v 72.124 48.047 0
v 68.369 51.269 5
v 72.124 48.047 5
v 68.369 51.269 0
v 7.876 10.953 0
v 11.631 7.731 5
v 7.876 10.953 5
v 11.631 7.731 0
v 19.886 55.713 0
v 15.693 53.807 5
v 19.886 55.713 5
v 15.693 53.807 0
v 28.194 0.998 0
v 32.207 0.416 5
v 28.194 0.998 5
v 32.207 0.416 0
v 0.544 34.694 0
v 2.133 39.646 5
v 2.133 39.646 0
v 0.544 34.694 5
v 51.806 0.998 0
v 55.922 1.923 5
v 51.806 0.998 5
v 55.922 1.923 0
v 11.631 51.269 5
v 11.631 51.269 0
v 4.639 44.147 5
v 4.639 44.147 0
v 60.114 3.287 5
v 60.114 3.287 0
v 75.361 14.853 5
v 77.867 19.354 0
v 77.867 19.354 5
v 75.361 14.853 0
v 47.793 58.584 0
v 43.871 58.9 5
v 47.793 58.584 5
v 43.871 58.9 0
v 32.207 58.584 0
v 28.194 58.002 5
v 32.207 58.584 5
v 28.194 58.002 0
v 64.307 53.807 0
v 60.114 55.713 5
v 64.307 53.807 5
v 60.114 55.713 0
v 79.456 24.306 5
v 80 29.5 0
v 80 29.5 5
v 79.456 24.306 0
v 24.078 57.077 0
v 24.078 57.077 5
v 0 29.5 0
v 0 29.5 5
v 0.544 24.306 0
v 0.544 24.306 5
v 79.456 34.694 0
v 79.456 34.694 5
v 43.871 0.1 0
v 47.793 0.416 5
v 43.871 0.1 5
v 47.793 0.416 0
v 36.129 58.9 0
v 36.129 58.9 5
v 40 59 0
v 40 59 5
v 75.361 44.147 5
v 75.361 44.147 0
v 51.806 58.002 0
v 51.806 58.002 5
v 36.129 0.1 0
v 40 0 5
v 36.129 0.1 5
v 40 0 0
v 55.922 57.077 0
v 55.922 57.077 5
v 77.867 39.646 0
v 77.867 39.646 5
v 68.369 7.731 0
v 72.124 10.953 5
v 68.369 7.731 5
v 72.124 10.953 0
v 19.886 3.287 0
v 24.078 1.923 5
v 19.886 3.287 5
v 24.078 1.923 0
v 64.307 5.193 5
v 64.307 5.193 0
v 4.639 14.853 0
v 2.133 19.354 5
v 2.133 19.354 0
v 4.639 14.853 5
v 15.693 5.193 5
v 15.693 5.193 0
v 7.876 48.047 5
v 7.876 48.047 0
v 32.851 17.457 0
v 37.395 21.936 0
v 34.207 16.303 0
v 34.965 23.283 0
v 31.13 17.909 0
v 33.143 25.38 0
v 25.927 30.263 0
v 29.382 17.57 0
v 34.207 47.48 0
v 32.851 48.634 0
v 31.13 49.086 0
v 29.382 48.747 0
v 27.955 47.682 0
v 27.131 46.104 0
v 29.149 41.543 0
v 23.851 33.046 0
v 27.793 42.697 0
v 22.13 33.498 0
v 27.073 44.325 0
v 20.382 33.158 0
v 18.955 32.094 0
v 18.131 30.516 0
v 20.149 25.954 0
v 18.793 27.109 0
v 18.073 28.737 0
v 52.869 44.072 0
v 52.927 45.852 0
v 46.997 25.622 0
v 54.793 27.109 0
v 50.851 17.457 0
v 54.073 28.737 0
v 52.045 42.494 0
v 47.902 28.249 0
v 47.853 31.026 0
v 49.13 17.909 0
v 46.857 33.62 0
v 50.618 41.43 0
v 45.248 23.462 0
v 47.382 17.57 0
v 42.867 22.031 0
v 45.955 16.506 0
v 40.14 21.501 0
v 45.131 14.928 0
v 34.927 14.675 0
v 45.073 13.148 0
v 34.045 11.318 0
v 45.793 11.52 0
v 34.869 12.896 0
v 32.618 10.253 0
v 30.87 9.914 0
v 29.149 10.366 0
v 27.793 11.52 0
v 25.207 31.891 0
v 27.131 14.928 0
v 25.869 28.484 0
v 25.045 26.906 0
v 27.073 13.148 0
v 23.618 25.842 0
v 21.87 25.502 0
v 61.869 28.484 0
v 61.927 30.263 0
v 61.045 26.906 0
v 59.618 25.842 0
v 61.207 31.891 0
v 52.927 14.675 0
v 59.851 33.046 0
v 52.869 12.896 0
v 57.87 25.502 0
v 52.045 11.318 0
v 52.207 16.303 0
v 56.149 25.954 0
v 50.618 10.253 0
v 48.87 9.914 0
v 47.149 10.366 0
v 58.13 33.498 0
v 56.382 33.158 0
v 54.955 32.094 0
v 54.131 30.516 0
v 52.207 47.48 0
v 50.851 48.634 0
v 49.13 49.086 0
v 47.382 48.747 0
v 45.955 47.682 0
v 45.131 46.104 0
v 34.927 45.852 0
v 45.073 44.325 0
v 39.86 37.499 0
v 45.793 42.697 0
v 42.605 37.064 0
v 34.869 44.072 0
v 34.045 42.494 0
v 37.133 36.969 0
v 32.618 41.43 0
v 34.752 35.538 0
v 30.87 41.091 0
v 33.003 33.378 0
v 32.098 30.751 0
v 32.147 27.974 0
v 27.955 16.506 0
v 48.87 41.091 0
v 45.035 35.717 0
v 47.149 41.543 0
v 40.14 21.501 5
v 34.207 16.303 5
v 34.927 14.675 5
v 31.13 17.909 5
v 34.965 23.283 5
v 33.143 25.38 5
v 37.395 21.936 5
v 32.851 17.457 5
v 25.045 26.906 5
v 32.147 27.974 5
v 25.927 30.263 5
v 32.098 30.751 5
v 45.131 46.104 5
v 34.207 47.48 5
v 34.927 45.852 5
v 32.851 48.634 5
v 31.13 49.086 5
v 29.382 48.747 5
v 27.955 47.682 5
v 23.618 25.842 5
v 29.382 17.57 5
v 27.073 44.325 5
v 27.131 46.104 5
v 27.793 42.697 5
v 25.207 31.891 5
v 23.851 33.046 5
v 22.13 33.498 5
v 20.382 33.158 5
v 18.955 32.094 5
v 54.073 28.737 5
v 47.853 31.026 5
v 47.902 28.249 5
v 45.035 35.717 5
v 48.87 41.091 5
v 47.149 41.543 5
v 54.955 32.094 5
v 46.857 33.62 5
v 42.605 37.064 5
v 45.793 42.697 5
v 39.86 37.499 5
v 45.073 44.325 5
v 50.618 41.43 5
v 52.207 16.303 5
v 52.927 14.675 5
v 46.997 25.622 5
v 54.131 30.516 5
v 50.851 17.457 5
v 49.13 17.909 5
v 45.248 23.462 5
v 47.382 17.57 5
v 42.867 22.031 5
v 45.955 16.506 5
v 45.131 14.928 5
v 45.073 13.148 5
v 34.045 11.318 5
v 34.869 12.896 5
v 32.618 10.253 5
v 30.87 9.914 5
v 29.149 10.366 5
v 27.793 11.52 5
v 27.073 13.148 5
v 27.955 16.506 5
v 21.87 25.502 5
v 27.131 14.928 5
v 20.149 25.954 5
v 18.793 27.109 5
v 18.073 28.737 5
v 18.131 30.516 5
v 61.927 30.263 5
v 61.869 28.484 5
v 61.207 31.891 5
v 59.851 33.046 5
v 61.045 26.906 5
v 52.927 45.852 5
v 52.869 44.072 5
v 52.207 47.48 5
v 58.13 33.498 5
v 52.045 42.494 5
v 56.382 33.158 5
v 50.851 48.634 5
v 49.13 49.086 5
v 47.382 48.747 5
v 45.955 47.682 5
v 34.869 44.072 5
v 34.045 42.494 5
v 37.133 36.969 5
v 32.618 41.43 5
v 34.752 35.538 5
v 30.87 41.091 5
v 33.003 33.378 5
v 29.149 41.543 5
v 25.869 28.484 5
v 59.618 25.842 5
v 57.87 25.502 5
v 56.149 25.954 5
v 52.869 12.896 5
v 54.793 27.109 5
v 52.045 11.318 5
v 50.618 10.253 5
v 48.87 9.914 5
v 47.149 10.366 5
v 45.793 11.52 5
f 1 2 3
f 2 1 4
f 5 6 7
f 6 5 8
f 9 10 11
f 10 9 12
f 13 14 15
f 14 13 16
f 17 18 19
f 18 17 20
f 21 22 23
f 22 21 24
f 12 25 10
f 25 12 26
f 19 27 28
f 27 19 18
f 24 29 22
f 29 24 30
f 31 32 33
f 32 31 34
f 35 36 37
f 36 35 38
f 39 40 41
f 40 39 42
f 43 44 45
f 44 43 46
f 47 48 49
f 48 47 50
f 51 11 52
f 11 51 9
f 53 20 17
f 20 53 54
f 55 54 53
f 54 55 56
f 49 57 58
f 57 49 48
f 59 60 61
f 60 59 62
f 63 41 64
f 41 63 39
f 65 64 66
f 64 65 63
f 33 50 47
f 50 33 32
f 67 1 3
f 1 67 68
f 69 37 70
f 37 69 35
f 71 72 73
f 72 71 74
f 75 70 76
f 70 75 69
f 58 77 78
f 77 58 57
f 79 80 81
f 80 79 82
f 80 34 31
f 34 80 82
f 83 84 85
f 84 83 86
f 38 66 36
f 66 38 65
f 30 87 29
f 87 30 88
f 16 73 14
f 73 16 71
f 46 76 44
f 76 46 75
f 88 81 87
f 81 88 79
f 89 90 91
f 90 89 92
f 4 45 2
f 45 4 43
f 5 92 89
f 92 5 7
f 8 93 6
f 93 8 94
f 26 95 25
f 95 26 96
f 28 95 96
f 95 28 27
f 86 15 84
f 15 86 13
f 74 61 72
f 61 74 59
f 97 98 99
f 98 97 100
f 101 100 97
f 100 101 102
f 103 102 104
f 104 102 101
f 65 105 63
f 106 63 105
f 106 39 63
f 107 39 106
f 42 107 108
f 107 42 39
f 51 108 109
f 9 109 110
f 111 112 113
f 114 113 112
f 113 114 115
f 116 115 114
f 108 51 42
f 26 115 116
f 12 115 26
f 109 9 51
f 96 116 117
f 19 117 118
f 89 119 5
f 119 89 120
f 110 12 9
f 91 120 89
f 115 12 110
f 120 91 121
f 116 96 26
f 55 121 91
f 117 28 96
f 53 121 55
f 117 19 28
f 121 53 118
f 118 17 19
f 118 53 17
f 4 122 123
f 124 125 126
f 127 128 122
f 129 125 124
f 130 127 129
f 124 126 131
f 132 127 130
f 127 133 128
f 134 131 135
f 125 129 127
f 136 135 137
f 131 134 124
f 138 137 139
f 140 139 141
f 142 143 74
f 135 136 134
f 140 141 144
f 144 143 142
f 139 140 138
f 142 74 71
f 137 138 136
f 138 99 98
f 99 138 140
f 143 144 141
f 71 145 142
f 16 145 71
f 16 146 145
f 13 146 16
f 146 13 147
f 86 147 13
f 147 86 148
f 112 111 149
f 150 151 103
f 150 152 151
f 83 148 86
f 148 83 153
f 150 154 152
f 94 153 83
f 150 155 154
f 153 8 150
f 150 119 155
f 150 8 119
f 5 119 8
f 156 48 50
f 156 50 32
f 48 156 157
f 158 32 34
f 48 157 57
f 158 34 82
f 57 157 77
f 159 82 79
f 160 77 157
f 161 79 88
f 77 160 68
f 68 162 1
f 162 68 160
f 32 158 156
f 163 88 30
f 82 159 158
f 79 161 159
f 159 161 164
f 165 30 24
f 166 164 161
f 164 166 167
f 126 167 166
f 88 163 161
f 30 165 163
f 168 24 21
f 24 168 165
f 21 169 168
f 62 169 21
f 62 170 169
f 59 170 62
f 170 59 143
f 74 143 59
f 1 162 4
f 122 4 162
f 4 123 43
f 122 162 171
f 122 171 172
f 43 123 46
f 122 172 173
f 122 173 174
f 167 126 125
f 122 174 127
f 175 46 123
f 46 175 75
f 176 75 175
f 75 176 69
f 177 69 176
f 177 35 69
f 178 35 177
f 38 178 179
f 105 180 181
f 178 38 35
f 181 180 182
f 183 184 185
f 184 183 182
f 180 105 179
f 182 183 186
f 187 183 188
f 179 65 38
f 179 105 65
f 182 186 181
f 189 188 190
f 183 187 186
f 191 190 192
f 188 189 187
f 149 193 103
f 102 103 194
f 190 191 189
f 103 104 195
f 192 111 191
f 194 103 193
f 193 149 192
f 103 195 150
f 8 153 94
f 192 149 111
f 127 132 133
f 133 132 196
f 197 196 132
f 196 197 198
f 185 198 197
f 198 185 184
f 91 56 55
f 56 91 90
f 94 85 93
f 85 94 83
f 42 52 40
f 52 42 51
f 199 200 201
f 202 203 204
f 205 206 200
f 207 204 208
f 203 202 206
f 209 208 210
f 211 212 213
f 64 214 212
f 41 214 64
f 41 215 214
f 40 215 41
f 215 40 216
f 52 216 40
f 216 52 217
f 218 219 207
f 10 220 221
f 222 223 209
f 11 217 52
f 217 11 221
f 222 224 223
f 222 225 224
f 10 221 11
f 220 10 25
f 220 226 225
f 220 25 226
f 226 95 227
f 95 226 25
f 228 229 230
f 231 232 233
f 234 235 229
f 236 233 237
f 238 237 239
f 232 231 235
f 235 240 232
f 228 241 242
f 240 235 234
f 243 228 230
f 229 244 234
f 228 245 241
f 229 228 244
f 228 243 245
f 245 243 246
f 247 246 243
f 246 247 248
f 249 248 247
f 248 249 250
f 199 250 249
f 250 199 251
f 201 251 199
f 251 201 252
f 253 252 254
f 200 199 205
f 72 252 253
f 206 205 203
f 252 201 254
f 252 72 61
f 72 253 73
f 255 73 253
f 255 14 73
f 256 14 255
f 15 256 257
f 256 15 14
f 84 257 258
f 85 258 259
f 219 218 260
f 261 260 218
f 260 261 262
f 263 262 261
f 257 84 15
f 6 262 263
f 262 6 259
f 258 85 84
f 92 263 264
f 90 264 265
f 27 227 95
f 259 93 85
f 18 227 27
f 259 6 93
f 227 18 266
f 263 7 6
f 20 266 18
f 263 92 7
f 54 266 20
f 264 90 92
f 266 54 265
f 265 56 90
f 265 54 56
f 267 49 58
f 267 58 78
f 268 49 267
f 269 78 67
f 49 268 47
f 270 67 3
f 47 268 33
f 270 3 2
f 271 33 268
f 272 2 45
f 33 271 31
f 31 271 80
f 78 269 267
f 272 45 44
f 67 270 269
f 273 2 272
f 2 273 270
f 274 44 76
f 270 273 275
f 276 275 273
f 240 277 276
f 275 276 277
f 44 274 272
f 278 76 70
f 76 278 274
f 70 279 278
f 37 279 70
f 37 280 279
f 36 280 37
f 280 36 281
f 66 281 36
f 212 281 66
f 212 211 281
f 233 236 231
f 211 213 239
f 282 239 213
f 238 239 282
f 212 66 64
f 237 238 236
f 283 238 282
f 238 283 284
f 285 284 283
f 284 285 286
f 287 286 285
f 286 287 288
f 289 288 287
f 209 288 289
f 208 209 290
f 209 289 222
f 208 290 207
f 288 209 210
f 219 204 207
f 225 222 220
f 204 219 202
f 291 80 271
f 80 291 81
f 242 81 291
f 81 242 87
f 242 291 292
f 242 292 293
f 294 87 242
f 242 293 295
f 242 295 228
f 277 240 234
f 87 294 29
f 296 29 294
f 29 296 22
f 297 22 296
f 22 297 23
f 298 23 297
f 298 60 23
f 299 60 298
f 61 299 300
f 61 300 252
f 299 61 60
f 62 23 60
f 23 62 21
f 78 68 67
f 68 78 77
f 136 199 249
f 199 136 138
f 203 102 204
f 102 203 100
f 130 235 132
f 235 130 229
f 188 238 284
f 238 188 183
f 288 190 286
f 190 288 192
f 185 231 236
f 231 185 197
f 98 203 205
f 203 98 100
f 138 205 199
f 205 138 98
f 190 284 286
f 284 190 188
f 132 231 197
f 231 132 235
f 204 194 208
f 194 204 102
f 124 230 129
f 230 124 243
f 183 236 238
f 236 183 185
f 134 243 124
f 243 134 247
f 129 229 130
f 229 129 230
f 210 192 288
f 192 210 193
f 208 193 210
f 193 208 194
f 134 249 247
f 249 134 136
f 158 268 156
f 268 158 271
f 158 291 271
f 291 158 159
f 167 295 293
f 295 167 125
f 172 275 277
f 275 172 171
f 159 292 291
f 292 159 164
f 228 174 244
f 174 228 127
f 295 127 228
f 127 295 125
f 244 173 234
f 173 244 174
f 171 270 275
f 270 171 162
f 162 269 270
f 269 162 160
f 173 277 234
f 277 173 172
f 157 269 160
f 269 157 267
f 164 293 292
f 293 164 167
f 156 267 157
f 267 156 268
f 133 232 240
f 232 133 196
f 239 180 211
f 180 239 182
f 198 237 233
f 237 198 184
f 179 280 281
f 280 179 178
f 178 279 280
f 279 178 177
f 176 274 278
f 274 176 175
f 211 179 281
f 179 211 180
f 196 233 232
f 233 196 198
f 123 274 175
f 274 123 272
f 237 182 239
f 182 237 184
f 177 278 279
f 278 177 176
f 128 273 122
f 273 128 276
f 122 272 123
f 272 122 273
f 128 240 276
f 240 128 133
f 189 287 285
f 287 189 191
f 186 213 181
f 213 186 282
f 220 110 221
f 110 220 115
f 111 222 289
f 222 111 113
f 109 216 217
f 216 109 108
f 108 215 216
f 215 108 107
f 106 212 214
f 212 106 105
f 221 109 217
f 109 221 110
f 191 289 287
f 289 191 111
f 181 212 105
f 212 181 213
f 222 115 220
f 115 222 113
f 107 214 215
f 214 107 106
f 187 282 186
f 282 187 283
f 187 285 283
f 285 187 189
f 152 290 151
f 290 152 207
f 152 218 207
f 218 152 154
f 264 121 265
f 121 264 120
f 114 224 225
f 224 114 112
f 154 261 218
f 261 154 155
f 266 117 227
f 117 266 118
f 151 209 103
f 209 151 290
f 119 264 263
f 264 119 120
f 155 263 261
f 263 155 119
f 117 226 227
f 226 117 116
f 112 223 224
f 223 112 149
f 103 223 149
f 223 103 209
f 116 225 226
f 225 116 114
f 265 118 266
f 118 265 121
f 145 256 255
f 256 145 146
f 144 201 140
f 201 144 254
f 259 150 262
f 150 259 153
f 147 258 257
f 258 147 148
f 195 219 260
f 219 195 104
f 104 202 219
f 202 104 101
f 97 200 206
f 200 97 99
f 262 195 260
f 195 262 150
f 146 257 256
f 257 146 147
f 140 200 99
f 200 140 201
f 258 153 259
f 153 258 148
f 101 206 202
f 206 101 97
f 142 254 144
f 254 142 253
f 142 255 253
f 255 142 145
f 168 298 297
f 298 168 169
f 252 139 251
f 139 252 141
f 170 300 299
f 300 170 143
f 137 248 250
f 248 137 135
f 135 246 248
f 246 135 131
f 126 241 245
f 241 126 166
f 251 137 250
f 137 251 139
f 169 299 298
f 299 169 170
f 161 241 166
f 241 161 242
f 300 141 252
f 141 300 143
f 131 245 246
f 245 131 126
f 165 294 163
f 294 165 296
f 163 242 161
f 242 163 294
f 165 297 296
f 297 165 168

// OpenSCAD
$fn = 32;

// ----------------------------------------------------------------------
// Cam plate: double_lobe cam, base R28
// ----------------------------------------------------------------------

// --- parameters (mm) ---
base_r = 28;              // base circle radius
lobe_h = 12;              // cam lobe rise
bore_r = 8;               // shaft bore radius
plate_t = 5;              // plate thickness, Z (extrusion height)
ring_r = 18;              // lightening ring radius
bolt_r = 4;               // lightening hole radius

profile = [[80, 29.5], [79.456, 34.694], [77.867, 39.646], [75.361, 44.147], [72.124, 48.047], [68.369, 51.269], [64.307, 53.807], [60.114, 55.713], [55.922, 57.077], [51.806, 58.002], [47.793, 58.584], [43.871, 58.9], [40, 59], [36.129, 58.9], [32.207, 58.584], [28.194, 58.002], [24.078, 57.077], [19.886, 55.713], [15.693, 53.807], [11.631, 51.269], [7.876, 48.047], [4.639, 44.147], [2.133, 39.646], [0.544, 34.694], [0, 29.5], [0.544, 24.306], [2.133, 19.354], [4.639, 14.853], [7.876, 10.953], [11.631, 7.731], [15.693, 5.193], [19.886, 3.287], [24.078, 1.923], [28.194, 0.998], [32.207, 0.416], [36.129, 0.1], [40, 0], [43.871, 0.1], [47.793, 0.416], [51.806, 0.998], [55.922, 1.923], [60.114, 3.287], [64.307, 5.193], [68.369, 7.731], [72.124, 10.953], [75.361, 14.853], [77.867, 19.354], [79.456, 24.306]];  // primary outline, 48 points, counter clockwise
void_1 = [[47.853, 31.026], [46.857, 33.62], [45.035, 35.717], [42.605, 37.064], [39.86, 37.499], [37.133, 36.969], [34.752, 35.538], [33.003, 33.378], [32.098, 30.751], [32.147, 27.974], [33.143, 25.38], [34.965, 23.283], [37.395, 21.936], [40.14, 21.501], [42.867, 22.031], [45.248, 23.462], [46.997, 25.622], [47.902, 28.249]];  // shaft bore, 18 points
void_2 = [[61.927, 30.263], [61.207, 31.891], [59.851, 33.046], [58.13, 33.498], [56.382, 33.158], [54.955, 32.094], [54.131, 30.516], [54.073, 28.737], [54.793, 27.109], [56.149, 25.954], [57.87, 25.502], [59.618, 25.842], [61.045, 26.906], [61.869, 28.484]];  // lightening hole 1, 14 points
void_3 = [[52.927, 45.852], [52.207, 47.48], [50.851, 48.634], [49.13, 49.086], [47.382, 48.747], [45.955, 47.682], [45.131, 46.104], [45.073, 44.325], [45.793, 42.697], [47.149, 41.543], [48.87, 41.091], [50.618, 41.43], [52.045, 42.494], [52.869, 44.072]];  // lightening hole 2, 14 points
void_4 = [[34.927, 45.852], [34.207, 47.48], [32.851, 48.634], [31.13, 49.086], [29.382, 48.747], [27.955, 47.682], [27.131, 46.104], [27.073, 44.325], [27.793, 42.697], [29.149, 41.543], [30.87, 41.091], [32.618, 41.43], [34.045, 42.494], [34.869, 44.072]];  // lightening hole 3, 14 points
void_5 = [[25.927, 30.263], [25.207, 31.891], [23.851, 33.046], [22.13, 33.498], [20.382, 33.158], [18.955, 32.094], [18.131, 30.516], [18.073, 28.737], [18.793, 27.109], [20.149, 25.954], [21.87, 25.502], [23.618, 25.842], [25.045, 26.906], [25.869, 28.484]];  // lightening hole 4, 14 points
void_6 = [[34.927, 14.675], [34.207, 16.303], [32.851, 17.457], [31.13, 17.909], [29.382, 17.57], [27.955, 16.506], [27.131, 14.928], [27.073, 13.148], [27.793, 11.52], [29.149, 10.366], [30.87, 9.914], [32.618, 10.253], [34.045, 11.318], [34.869, 12.896]];  // lightening hole 5, 14 points
void_7 = [[52.927, 14.675], [52.207, 16.303], [50.851, 17.457], [49.13, 17.909], [47.382, 17.57], [45.955, 16.506], [45.131, 14.928], [45.073, 13.148], [45.793, 11.52], [47.149, 10.366], [48.87, 9.914], [50.618, 10.253], [52.045, 11.318], [52.869, 12.896]];  // lightening hole 6, 14 points

// --- the one profile operation ---
difference() {
  linear_extrude(height = plate_t) polygon(points = profile);
  translate([0, 0, -1])
    linear_extrude(height = plate_t + 2) polygon(points = void_1);
  translate([0, 0, -1])
    linear_extrude(height = plate_t + 2) polygon(points = void_2);
  translate([0, 0, -1])
    linear_extrude(height = plate_t + 2) polygon(points = void_3);
  translate([0, 0, -1])
    linear_extrude(height = plate_t + 2) polygon(points = void_4);
  translate([0, 0, -1])
    linear_extrude(height = plate_t + 2) polygon(points = void_5);
  translate([0, 0, -1])
    linear_extrude(height = plate_t + 2) polygon(points = void_6);
  translate([0, 0, -1])
    linear_extrude(height = plate_t + 2) polygon(points = void_7);
}
